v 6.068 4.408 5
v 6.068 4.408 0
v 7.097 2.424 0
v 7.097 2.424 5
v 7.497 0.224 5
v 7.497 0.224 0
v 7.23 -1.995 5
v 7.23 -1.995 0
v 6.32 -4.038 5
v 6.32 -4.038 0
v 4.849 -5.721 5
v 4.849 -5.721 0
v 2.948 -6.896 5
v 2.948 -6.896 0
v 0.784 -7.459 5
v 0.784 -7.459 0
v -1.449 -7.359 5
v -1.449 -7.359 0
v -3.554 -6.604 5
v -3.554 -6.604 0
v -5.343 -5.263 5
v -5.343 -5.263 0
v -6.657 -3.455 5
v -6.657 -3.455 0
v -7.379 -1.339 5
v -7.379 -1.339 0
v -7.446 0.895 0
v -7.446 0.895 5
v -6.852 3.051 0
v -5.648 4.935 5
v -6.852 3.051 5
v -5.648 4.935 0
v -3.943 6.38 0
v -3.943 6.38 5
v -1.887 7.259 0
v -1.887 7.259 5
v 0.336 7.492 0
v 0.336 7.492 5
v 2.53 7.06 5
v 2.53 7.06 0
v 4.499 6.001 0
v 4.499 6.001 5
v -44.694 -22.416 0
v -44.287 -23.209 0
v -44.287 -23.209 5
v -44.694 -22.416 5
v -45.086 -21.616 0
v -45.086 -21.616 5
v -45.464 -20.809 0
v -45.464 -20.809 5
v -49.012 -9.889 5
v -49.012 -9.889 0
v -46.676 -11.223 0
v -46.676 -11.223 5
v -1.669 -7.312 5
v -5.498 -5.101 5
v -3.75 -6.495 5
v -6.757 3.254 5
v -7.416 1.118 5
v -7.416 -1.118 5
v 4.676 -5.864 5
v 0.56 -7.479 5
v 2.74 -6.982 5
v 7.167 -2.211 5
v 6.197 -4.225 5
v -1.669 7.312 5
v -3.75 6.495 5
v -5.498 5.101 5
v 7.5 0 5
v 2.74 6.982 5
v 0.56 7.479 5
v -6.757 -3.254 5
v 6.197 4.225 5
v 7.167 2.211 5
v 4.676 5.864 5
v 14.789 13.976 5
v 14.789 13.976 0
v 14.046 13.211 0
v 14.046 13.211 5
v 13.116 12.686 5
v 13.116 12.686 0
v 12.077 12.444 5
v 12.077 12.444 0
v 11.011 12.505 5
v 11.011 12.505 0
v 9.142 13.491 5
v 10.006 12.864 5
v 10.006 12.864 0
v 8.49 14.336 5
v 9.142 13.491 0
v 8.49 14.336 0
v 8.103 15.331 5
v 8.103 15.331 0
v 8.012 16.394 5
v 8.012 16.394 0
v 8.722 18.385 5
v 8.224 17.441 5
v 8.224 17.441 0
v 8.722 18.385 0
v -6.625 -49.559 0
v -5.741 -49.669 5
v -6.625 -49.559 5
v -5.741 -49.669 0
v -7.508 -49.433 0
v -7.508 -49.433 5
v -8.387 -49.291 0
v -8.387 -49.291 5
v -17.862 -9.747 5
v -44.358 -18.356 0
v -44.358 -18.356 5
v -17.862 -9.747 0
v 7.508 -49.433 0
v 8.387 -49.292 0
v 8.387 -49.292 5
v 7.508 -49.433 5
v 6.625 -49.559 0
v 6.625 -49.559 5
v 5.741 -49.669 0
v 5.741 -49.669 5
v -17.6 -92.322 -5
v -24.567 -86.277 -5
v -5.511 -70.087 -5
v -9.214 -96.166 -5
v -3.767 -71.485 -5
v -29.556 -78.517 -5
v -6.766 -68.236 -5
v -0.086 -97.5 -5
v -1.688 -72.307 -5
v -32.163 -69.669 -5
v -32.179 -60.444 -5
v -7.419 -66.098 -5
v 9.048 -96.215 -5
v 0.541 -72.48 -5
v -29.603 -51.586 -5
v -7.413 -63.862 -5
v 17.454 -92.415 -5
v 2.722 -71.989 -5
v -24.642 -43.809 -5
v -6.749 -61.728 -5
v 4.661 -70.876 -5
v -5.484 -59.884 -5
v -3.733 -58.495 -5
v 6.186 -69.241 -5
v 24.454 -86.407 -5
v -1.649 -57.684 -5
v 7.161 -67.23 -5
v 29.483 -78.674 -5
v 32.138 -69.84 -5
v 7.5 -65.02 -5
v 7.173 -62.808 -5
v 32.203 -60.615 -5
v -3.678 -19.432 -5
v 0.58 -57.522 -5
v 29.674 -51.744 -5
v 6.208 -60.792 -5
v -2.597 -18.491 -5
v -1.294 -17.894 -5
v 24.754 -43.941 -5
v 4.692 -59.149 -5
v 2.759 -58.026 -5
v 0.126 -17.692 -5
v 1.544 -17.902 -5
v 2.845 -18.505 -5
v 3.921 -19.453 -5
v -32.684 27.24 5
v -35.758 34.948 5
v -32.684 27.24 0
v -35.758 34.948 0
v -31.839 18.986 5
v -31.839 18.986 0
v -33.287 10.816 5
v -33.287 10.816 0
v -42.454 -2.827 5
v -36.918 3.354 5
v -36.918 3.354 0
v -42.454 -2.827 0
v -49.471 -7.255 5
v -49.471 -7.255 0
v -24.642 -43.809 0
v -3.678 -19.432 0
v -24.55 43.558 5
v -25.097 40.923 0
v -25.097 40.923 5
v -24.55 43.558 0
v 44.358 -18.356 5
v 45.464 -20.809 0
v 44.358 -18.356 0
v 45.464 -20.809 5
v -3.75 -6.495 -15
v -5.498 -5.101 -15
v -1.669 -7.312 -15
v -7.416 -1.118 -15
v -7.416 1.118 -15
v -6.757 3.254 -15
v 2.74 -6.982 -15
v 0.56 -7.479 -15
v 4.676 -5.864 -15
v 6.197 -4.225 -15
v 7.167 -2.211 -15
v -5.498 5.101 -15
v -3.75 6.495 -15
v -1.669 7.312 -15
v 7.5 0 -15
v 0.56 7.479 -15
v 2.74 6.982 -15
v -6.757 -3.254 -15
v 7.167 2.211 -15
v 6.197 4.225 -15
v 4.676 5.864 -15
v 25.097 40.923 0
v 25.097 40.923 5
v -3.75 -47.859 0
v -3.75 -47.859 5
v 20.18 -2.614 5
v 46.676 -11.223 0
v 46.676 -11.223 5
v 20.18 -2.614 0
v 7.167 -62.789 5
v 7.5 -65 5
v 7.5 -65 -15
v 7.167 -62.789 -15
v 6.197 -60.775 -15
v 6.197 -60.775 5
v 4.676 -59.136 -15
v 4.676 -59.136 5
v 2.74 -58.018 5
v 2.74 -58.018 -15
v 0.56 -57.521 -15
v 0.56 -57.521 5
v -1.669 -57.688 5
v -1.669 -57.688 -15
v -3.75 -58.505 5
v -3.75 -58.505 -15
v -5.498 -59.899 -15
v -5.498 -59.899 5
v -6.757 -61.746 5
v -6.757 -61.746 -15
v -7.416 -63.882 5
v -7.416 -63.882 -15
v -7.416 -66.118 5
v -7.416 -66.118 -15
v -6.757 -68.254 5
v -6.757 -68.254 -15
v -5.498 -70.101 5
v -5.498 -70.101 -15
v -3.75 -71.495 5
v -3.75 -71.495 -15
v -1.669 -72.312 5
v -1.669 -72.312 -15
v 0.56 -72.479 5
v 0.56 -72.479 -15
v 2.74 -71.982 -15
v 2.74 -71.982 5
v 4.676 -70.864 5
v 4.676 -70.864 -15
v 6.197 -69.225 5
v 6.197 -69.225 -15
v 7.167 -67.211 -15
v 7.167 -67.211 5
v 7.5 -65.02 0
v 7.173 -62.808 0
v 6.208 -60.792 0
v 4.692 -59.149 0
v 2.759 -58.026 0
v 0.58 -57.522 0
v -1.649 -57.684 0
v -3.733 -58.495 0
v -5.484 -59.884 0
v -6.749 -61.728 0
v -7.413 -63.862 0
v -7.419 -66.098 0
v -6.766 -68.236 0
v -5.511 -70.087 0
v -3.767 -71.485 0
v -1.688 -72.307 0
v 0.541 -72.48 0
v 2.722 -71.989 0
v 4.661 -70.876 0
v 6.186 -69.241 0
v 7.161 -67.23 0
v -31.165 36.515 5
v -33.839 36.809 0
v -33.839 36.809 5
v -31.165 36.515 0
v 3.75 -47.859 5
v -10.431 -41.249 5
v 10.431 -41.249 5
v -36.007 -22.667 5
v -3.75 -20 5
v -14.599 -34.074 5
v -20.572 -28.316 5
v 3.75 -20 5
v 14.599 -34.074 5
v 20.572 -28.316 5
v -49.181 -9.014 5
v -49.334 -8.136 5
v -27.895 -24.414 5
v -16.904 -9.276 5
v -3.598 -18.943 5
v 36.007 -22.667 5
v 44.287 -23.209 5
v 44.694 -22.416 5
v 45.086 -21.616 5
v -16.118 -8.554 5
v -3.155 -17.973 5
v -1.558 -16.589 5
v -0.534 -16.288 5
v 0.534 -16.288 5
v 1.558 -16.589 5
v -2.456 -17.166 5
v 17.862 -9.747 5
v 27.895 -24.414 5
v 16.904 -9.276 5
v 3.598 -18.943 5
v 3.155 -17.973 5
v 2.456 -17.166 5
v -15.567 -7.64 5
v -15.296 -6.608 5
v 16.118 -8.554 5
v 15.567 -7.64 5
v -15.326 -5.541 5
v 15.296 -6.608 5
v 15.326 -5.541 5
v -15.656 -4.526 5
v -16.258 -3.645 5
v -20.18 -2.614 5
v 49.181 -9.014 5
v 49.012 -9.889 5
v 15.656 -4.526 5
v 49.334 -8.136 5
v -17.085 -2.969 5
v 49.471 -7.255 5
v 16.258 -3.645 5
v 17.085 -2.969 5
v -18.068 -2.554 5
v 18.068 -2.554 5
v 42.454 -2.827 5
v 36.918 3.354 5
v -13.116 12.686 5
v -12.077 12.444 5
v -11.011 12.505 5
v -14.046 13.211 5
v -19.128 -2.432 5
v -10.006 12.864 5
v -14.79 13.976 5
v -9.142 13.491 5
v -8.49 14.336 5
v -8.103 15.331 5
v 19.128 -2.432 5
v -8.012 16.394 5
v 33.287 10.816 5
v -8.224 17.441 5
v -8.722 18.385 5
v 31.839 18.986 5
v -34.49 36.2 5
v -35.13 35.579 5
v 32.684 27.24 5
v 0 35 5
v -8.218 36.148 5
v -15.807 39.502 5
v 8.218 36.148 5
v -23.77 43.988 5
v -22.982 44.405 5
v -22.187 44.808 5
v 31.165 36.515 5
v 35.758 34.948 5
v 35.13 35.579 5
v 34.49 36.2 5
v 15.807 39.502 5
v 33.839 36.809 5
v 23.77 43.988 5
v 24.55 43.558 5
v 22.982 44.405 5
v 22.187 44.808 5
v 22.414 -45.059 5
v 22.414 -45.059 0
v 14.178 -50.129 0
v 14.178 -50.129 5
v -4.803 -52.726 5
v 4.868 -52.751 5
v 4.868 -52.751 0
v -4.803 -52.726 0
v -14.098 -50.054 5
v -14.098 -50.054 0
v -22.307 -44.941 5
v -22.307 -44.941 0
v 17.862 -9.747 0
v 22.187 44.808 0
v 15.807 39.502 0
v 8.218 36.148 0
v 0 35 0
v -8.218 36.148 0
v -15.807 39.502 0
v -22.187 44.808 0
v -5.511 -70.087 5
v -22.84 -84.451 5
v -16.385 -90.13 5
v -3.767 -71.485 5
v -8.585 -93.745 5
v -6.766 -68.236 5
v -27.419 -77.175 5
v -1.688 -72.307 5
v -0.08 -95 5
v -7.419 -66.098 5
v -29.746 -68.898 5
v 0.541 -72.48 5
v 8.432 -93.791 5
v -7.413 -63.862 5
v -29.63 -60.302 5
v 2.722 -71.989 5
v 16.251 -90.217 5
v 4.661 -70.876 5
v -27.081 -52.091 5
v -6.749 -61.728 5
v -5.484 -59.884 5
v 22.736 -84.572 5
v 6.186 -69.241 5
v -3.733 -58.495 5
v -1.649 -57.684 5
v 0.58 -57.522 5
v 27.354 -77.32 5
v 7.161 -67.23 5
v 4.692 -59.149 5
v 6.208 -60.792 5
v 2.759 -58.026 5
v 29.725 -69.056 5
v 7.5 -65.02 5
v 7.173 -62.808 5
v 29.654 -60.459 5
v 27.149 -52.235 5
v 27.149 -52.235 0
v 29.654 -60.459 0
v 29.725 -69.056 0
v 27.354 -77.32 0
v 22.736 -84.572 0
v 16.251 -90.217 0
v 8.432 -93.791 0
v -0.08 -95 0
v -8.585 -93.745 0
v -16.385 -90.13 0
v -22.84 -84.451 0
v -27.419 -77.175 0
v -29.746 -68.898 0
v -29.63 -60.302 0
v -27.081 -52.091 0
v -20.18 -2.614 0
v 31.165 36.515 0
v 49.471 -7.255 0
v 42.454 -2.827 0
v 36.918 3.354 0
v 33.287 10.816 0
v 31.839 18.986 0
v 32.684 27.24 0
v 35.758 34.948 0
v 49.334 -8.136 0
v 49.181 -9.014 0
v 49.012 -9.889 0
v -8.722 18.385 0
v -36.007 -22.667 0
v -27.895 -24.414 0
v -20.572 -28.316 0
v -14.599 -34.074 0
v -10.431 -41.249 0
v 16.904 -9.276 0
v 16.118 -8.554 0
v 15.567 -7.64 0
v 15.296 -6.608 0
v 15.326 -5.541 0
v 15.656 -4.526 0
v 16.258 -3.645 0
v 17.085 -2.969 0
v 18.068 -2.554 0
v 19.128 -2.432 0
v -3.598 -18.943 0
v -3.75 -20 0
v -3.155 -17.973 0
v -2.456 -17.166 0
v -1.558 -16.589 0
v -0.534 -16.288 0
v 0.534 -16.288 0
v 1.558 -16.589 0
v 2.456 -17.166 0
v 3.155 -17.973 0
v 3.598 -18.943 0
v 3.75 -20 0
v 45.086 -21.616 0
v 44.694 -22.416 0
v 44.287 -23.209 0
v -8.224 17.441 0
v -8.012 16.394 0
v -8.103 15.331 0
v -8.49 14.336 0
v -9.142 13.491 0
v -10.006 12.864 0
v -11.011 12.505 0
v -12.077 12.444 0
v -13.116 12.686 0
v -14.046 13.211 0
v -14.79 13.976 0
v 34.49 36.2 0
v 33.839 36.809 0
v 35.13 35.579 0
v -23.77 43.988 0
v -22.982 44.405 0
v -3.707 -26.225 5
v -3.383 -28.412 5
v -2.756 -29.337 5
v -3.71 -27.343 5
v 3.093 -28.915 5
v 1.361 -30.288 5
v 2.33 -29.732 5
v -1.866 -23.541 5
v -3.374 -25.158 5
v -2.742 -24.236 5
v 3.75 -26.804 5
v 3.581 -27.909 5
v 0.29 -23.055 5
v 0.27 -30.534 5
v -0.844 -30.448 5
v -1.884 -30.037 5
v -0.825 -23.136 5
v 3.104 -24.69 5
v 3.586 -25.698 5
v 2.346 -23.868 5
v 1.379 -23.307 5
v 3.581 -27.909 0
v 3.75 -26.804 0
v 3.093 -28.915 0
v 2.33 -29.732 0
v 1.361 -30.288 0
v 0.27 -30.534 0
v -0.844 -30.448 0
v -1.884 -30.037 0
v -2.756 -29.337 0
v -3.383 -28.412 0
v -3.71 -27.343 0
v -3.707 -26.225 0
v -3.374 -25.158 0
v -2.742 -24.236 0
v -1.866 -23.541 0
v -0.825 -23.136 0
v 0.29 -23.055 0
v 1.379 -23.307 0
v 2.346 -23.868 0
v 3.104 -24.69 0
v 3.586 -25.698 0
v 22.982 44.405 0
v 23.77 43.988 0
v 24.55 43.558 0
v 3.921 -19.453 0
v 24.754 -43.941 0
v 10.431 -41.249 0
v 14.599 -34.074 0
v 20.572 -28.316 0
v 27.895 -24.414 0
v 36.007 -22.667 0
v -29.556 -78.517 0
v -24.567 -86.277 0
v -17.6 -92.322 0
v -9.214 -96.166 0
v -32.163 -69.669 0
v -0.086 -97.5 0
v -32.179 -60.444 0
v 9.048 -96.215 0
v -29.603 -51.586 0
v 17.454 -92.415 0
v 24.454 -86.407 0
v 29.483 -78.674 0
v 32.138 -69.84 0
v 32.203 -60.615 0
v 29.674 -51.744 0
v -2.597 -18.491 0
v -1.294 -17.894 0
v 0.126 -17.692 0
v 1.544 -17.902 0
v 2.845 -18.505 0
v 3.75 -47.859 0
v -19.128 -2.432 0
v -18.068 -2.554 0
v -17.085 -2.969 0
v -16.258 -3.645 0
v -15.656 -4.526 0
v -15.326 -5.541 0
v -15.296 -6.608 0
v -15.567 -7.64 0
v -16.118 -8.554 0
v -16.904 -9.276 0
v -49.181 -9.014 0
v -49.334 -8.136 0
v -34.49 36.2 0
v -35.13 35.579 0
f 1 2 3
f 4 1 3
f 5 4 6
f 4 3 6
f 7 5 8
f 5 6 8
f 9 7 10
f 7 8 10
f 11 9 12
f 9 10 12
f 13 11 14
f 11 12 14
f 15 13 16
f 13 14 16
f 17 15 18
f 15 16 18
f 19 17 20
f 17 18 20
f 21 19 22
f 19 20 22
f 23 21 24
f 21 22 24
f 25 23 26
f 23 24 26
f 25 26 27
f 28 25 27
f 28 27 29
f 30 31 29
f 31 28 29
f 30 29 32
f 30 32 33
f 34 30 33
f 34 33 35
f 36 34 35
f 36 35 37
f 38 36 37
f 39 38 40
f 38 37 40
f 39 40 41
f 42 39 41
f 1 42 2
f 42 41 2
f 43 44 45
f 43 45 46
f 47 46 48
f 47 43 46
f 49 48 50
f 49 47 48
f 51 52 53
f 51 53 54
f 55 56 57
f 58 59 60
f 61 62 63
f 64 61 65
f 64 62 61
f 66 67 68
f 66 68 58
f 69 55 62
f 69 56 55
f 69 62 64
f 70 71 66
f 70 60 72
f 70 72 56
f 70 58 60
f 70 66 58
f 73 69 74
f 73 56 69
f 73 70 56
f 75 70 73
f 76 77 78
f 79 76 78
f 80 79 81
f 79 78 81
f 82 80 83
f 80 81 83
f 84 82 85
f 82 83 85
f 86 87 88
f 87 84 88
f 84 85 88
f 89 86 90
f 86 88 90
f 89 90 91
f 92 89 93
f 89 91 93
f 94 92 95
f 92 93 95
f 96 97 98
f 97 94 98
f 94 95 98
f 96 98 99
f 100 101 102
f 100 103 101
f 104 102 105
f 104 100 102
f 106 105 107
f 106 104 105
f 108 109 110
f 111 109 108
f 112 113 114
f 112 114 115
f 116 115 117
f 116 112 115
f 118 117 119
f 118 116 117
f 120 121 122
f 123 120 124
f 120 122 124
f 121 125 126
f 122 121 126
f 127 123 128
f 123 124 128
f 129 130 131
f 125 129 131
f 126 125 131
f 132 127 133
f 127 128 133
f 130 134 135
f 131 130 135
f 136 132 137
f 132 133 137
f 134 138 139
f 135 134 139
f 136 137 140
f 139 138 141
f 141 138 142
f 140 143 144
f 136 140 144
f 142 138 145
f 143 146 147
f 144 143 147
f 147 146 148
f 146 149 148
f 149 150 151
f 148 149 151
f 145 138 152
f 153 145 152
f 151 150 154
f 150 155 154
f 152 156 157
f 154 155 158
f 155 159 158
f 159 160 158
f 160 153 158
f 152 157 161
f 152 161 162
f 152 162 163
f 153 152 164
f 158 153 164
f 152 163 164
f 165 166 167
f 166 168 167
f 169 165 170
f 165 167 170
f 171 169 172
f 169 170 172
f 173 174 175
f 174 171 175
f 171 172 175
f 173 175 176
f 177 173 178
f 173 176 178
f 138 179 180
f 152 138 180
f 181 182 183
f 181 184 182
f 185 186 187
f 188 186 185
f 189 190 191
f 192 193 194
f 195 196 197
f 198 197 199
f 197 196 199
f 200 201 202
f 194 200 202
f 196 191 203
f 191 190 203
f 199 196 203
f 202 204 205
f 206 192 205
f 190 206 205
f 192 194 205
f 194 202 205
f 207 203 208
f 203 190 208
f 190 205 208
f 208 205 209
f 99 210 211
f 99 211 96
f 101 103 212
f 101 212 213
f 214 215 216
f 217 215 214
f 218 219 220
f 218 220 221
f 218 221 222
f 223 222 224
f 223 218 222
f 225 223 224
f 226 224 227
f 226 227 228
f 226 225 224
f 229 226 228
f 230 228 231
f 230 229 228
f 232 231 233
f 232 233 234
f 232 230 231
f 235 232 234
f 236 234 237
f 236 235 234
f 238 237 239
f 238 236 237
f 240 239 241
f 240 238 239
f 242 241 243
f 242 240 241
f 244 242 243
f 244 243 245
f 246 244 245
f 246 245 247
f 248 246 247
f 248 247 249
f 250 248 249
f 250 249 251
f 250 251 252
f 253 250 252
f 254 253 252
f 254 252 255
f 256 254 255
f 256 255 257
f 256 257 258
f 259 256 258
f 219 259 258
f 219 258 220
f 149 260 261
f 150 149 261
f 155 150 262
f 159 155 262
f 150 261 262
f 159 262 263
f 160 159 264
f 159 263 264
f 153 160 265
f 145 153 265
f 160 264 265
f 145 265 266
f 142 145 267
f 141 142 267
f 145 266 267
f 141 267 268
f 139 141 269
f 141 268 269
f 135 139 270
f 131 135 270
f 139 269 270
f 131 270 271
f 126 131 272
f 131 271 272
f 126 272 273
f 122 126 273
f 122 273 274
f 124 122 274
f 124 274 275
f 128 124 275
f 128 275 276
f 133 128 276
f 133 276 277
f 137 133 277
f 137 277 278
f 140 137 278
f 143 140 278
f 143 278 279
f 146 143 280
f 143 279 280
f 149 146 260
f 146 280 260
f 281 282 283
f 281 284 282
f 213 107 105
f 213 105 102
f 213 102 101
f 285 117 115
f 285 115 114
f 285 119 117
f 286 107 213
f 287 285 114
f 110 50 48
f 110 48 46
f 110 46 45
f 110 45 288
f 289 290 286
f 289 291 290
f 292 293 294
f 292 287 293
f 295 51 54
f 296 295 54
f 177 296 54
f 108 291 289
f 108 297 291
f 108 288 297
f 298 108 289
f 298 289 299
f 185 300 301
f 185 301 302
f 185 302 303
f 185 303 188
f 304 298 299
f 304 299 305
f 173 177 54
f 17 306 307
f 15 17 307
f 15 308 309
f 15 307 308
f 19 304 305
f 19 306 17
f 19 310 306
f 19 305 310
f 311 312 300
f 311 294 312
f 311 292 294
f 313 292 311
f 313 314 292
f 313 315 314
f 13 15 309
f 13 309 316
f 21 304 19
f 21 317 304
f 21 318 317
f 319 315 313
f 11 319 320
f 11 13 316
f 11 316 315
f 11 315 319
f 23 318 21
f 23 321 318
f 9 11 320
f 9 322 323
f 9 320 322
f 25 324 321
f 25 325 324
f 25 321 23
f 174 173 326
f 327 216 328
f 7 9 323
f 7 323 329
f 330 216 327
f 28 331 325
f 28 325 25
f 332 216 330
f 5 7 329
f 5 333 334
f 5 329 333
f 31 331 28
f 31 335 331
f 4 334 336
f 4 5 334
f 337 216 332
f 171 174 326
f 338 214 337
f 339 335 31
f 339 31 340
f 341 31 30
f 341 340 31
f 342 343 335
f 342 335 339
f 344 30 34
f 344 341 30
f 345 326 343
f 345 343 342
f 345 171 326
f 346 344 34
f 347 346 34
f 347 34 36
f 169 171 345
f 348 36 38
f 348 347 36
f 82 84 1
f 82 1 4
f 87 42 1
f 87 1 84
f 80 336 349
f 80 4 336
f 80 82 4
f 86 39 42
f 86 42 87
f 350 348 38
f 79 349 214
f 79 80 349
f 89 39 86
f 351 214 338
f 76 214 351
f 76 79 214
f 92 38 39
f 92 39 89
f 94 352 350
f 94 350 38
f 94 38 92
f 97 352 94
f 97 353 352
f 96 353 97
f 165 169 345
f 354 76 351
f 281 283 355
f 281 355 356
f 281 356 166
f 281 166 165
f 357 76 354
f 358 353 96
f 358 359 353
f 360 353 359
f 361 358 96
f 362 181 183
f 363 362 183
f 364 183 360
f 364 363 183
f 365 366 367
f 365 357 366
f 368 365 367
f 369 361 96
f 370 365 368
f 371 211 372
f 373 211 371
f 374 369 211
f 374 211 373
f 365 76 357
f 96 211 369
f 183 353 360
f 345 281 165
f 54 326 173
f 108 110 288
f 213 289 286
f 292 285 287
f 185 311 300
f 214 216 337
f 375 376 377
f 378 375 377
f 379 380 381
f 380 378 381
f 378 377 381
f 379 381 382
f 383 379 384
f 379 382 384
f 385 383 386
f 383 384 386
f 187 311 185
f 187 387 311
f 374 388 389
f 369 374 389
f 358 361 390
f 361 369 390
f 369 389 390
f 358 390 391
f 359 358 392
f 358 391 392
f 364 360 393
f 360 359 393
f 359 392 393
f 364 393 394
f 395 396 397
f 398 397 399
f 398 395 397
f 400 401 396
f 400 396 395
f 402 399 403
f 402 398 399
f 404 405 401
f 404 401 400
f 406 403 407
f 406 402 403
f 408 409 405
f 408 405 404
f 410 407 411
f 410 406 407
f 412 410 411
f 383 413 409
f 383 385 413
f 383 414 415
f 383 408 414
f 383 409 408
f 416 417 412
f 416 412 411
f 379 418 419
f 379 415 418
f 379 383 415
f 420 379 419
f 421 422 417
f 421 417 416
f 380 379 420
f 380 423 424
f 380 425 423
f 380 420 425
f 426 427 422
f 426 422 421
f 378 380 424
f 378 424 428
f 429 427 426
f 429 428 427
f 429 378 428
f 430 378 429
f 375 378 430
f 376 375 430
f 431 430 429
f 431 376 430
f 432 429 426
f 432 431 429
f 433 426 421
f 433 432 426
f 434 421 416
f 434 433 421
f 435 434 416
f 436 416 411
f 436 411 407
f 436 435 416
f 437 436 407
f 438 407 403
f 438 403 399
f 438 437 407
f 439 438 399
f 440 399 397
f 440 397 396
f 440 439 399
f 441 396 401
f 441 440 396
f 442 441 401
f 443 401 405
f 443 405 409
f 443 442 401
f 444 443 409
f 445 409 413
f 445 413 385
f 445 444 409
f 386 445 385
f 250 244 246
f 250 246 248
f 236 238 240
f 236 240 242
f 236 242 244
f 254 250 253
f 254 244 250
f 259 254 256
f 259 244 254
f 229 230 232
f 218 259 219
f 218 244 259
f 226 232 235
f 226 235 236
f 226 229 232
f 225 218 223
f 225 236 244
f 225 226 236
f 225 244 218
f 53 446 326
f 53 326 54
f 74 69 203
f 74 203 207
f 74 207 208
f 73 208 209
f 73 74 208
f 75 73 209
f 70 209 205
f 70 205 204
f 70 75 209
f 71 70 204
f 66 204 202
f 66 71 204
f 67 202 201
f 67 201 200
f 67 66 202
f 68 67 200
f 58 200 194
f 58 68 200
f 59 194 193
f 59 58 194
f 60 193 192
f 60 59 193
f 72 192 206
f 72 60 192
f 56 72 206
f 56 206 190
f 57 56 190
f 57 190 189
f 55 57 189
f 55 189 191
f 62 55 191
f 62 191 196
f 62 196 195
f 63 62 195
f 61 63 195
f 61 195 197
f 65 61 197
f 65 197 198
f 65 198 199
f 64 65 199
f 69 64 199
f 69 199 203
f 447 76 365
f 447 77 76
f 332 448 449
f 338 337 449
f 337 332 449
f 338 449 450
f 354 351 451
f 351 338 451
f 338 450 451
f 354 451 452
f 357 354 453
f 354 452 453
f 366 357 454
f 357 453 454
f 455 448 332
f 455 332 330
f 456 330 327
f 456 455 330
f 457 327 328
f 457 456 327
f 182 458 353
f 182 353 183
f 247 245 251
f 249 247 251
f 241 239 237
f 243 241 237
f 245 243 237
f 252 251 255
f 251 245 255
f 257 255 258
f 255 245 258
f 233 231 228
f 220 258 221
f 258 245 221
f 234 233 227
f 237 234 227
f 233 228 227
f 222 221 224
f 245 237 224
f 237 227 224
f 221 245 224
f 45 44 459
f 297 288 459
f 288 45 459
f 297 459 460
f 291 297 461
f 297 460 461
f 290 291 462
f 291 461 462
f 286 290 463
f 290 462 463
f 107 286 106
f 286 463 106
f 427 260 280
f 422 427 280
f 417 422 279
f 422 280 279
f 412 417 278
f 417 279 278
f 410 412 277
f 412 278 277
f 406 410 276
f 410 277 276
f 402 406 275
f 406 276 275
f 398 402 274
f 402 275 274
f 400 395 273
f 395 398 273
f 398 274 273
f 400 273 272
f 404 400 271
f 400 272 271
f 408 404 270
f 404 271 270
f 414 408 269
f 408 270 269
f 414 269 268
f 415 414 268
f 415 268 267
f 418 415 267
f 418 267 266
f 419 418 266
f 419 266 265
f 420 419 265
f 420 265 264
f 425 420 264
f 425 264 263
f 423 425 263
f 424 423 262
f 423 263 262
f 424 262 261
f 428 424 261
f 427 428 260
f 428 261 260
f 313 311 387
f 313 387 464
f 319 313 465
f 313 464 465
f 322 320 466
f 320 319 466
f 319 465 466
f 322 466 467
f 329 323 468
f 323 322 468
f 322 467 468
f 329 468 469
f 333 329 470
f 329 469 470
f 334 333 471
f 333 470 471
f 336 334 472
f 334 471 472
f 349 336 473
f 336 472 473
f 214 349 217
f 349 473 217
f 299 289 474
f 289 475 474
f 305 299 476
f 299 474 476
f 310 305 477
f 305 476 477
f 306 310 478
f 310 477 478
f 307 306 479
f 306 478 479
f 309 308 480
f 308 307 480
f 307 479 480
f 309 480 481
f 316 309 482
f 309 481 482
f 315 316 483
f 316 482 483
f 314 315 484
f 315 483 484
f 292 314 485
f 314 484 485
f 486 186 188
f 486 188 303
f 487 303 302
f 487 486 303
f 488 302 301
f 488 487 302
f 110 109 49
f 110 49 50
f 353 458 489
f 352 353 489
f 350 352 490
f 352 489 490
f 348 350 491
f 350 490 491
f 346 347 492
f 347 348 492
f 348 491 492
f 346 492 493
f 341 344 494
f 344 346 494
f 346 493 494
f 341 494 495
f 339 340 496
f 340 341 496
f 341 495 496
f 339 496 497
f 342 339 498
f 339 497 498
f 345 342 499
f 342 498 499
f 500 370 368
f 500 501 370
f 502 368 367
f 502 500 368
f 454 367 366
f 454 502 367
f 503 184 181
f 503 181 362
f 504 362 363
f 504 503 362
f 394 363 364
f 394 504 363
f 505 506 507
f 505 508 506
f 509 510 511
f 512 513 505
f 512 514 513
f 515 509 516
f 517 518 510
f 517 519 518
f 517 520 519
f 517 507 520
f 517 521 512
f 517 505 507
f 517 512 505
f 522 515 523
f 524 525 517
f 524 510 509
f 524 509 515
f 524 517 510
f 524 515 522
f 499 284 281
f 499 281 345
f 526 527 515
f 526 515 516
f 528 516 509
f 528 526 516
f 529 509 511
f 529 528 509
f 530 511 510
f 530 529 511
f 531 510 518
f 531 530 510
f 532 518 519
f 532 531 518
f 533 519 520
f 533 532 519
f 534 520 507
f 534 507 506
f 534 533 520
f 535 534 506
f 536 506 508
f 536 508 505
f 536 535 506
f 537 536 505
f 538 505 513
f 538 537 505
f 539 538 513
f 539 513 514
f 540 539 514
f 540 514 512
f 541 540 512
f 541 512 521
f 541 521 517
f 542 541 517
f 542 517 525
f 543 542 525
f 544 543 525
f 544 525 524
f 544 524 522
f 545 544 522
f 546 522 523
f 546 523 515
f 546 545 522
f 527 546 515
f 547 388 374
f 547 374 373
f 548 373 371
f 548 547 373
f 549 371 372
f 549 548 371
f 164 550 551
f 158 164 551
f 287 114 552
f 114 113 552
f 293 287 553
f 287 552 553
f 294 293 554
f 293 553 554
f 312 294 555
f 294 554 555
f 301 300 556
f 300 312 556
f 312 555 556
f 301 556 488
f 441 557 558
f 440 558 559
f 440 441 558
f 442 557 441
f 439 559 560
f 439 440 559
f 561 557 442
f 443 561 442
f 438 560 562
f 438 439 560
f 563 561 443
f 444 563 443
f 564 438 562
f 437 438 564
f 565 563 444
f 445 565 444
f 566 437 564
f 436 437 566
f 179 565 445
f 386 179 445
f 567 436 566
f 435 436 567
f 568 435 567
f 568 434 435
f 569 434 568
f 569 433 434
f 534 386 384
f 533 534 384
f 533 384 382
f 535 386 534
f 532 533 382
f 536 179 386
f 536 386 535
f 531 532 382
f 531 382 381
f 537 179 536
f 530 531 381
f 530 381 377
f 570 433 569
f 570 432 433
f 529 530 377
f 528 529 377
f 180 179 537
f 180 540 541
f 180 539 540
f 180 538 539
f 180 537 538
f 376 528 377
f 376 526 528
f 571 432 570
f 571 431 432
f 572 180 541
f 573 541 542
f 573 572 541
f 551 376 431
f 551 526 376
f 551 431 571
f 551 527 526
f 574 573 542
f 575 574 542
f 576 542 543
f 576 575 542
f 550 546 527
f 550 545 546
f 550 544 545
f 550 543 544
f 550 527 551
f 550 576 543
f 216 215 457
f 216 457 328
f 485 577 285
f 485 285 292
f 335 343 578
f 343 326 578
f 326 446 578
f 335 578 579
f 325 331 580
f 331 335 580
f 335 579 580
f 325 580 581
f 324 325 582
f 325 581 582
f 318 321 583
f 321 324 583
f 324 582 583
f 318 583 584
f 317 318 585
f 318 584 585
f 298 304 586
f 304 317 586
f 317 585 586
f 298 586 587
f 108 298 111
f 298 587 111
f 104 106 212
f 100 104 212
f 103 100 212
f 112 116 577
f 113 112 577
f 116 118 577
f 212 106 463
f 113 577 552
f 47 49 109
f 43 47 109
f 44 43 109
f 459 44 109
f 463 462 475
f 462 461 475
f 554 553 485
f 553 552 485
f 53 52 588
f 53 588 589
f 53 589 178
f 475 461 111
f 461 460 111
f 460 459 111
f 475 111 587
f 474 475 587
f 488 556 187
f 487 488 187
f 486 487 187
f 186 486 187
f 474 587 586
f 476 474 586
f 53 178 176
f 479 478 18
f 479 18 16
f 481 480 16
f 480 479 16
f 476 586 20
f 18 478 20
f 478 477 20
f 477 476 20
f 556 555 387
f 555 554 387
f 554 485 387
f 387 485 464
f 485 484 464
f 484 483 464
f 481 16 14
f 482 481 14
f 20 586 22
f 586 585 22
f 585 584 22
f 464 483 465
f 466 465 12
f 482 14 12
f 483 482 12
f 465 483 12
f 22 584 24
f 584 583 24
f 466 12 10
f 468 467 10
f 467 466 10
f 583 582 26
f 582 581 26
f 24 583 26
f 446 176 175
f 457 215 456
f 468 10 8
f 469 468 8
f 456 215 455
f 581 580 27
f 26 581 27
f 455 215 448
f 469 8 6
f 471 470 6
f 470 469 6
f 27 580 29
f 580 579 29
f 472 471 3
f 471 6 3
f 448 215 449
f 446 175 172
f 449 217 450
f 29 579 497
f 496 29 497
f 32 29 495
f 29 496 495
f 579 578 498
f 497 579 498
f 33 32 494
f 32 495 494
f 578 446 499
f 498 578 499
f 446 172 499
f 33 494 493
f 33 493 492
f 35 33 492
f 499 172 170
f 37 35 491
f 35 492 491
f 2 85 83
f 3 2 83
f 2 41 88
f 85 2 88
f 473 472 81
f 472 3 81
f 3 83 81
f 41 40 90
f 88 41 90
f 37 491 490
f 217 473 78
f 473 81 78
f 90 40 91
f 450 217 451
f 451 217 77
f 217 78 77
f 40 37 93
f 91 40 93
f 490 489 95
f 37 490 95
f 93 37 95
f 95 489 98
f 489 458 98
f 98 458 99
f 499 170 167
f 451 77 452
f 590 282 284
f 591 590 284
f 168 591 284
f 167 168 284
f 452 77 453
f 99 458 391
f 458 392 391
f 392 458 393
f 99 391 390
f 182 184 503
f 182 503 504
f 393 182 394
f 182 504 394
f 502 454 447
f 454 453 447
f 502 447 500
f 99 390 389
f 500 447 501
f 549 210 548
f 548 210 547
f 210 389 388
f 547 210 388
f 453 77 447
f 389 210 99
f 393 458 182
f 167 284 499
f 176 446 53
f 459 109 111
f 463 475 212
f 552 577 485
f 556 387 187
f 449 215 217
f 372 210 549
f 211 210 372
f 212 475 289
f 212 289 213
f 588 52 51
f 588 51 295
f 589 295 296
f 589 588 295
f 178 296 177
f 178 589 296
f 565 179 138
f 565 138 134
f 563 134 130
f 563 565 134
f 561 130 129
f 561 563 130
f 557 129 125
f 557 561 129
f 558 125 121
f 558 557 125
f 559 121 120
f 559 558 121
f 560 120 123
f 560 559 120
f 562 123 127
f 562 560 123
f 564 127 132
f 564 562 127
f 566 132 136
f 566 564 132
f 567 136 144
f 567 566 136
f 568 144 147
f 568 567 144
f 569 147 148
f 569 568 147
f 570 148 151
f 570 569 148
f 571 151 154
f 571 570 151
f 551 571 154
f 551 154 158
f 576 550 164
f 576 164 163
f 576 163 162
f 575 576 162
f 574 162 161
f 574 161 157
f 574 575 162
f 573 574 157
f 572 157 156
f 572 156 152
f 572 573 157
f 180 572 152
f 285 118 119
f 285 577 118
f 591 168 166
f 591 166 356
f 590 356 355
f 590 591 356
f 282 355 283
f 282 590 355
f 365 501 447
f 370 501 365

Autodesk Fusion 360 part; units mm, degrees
sketch "Sketch1" plane through (0, 0, 0) normal (0, 0, 1) x (1, 0, 0) in component "follower"
  line L0 (0, 0) -> (29.3893, -40.4508) construction
  line L1 (0, 0) -> (50, 0) construction
  line L2 (0, 0) -> (-29.3893, -40.4508) construction
  line L3 (0, 0) -> (50, 0) construction
  circle A0 centre (0, -65) radius 38.206 construction
  line L4 (8.7219, -18.3845) -> (26.3554, -42.655)
  line L5 (32.4231, -38.2467) -> (14.7895, -13.9761)
  arc A1 (14.7895, -13.9761) -> (8.7219, -18.3845) centre (11.7557, -16.1803) ccw
  line L6 (11.7557, -16.1803) -> (29.3893, -40.4508) construction
  line L7 (46.394, 19.0173) -> (17.8623, 9.7468)
  arc A2 (17.8623, 9.7468) -> (20.1799, 2.6139) centre (19.0211, 6.1803) ccw
  line L8 (20.1799, 2.6139) -> (48.7116, 11.8844)
  line L9 (-3.75, 50) -> (-3.75, 20)
  arc A3 (-3.75, 20) -> (3.75, 20) centre (0, 20) ccw
  line L10 (3.75, 20) -> (3.75, 50)
  line L11 (-48.7116, 11.8844) -> (-20.1799, 2.6139)
  arc A4 (-20.1799, 2.6139) -> (-17.8623, 9.7468) centre (-19.0211, 6.1803) ccw
  line L12 (-17.8623, 9.7468) -> (-46.394, 19.0173)
  line L13 (-26.3554, -42.655) -> (-8.7219, -18.3845)
  arc A5 (-8.7219, -18.3845) -> (-14.7895, -13.9761) centre (-11.7557, -16.1803) ccw
  line L14 (-14.7895, -13.9761) -> (-32.4231, -38.2467)
  circle A6 centre (0, 0) radius 7.5
  arc A7 (-29.3893, -40.4508) -> (-29.3183, -40.5023) centre (0, 0) ccw
  arc A8 (-26.2727, -42.5411) -> (-22.1872, -44.8077) centre (0, 0) ccw
  arc A9 (22.1872, -44.8077) -> (26.2727, -42.5411) centre (0, 0) ccw
  arc A10 (22.1872, -44.8077) -> (-22.1872, -44.8077) centre (0, -65) ccw
  arc A11 (49.4709, 7.2549) -> (35.7584, -34.9476) centre (61.8187, -20.0861) ccw
  arc A12 (8.3875, 49.2915) -> (44.2871, 23.2089) centre (38.206, 52.5861) ccw
  arc A13 (-44.2871, 23.2089) -> (-8.3875, 49.2915) centre (-38.206, 52.5861) ccw
  arc A14 (-35.7584, -34.9476) -> (-49.4709, 7.2549) centre (-61.8187, -20.0861) ccw
  arc A15 (-48.5777, 11.8409) -> (-49.4709, 7.2549) centre (0, 0) ccw
  arc A16 (-35.7584, -34.9476) -> (-32.3403, -38.1327) centre (0, 0) ccw
  arc A17 (-3.75, 49.8592) -> (-8.3875, 49.2915) centre (0, 0) ccw
  arc A18 (-44.2871, 23.2089) -> (-46.2601, 18.9738) centre (0, 0) ccw
  arc A19 (46.2601, 18.9738) -> (44.2871, 23.2089) centre (0, 0) ccw
  arc A20 (8.3875, 49.2915) -> (3.75, 49.8592) centre (0, 0) ccw
  arc A21 (32.3403, -38.1327) -> (35.7584, -34.9476) centre (0, 0) ccw
  arc A22 (50, 0) -> (48.5777, 11.8409) centre (0, 0) ccw
  dimension "d13" = 360
extrude "Extrude1" add sketch "Sketch1" along normal blind 5 makes body 1 in component "follower"
chamfer "Chamfer1" distance 2 angle 45 10 edges at (3.75, 49.8592, 2.5) (-3.75, 49.8592, 2.5) (46.2601, 18.9738, 2.5) (48.5777, 11.8409, 2.5) (26.2727, -42.5411, 2.5) (32.3403, -38.1327, 2.5) (-26.2727, -42.5411, 2.5) (-32.3403, -38.1327, 2.5) (-48.5777, 11.8409, 2.5) (-46.2601, 18.9738, 2.5) on bodies 1 in component "follower"
sketch "Sketch1 (2)" plane through (0, 0, 0) normal (0, 0, 1) x (1, 0, 0) in component "cam"
sketch "Sketch2" plane through (0, 0, 0) normal (0, 0, 1) x (1, 0, 0) in component "cam"
  circle A0 centre (0, -65) radius 38.206
  circle A1 centre (0, -65) radius 30
  circle A2 centre (0, -65) radius 32.5
  circle A3 centre (0, -65) radius 7.5
  circle A4 centre (-0.1016, -26.7941) radius 3.75
  line L0 (-24.6979, -43.875) -> (-3.7997, -19.4423)
  line L1 (3.7997, -19.4423) -> (24.6979, -43.875)
  arc A5 (3.7997, -19.4423) -> (-3.7997, -19.4423) centre (0, -22.6923) ccw
  arc A6 (-22.3607, -45) -> (22.3607, -45) centre (0, -18.0742) ccw
  point P0 (0, -15)
  dimension "d17" = 60
  dimension "d18" = 65
  dimension "d19" = 15
  dimension "d20" = 7.5
  dimension "d21" = 15
  dimension "d22" = 5
  dimension "d23" = 20
  dimension "d24" = 35
extrude "Extrude1'" add sketch "Sketch2" against normal blind 5 separate body contours A0 A2 A4 L0 L1 | A0 A4 L0 L1 A5 | A0 A4 | A0 A4 | A2 | A1 A6 | A1 A6 makes body 2 in component "cam"
extrude "Extrude2" add sketch "Sketch2" along normal blind 5 contours A0 A4 | A0 A4 | A1 A6 picked at (-16.7037, -56.5009) bodies 2 in component "cam"
cylinder "CylinderPrimitive1" add diameter 15 height -20 placed x (1, 0, 0) y (0, 1, 0) z (0, 0, 1) at (0, 0, 5) separate body makes body 3 in component "Component"
component "cam" placed x (0.999996, -0.002659, 0) y (0.002659, 0.999996, 0) z (0, 0, 1) at (0.1729, -0.0002, 0)
component "follower" placed x (0.809017, 0.587785, 0) y (-0.587785, 0.809017, 0) z (0, 0, 1) at (0, 0, 0)
component "Component" placed x (1, 0, 0) y (0, 1, 0) z (0, 0, 1) at (0, 0, 0)
component "Component" placed x (1, 0, 0) y (0, 1, 0) z (0, 0, 1) at (0, -65, 0)
